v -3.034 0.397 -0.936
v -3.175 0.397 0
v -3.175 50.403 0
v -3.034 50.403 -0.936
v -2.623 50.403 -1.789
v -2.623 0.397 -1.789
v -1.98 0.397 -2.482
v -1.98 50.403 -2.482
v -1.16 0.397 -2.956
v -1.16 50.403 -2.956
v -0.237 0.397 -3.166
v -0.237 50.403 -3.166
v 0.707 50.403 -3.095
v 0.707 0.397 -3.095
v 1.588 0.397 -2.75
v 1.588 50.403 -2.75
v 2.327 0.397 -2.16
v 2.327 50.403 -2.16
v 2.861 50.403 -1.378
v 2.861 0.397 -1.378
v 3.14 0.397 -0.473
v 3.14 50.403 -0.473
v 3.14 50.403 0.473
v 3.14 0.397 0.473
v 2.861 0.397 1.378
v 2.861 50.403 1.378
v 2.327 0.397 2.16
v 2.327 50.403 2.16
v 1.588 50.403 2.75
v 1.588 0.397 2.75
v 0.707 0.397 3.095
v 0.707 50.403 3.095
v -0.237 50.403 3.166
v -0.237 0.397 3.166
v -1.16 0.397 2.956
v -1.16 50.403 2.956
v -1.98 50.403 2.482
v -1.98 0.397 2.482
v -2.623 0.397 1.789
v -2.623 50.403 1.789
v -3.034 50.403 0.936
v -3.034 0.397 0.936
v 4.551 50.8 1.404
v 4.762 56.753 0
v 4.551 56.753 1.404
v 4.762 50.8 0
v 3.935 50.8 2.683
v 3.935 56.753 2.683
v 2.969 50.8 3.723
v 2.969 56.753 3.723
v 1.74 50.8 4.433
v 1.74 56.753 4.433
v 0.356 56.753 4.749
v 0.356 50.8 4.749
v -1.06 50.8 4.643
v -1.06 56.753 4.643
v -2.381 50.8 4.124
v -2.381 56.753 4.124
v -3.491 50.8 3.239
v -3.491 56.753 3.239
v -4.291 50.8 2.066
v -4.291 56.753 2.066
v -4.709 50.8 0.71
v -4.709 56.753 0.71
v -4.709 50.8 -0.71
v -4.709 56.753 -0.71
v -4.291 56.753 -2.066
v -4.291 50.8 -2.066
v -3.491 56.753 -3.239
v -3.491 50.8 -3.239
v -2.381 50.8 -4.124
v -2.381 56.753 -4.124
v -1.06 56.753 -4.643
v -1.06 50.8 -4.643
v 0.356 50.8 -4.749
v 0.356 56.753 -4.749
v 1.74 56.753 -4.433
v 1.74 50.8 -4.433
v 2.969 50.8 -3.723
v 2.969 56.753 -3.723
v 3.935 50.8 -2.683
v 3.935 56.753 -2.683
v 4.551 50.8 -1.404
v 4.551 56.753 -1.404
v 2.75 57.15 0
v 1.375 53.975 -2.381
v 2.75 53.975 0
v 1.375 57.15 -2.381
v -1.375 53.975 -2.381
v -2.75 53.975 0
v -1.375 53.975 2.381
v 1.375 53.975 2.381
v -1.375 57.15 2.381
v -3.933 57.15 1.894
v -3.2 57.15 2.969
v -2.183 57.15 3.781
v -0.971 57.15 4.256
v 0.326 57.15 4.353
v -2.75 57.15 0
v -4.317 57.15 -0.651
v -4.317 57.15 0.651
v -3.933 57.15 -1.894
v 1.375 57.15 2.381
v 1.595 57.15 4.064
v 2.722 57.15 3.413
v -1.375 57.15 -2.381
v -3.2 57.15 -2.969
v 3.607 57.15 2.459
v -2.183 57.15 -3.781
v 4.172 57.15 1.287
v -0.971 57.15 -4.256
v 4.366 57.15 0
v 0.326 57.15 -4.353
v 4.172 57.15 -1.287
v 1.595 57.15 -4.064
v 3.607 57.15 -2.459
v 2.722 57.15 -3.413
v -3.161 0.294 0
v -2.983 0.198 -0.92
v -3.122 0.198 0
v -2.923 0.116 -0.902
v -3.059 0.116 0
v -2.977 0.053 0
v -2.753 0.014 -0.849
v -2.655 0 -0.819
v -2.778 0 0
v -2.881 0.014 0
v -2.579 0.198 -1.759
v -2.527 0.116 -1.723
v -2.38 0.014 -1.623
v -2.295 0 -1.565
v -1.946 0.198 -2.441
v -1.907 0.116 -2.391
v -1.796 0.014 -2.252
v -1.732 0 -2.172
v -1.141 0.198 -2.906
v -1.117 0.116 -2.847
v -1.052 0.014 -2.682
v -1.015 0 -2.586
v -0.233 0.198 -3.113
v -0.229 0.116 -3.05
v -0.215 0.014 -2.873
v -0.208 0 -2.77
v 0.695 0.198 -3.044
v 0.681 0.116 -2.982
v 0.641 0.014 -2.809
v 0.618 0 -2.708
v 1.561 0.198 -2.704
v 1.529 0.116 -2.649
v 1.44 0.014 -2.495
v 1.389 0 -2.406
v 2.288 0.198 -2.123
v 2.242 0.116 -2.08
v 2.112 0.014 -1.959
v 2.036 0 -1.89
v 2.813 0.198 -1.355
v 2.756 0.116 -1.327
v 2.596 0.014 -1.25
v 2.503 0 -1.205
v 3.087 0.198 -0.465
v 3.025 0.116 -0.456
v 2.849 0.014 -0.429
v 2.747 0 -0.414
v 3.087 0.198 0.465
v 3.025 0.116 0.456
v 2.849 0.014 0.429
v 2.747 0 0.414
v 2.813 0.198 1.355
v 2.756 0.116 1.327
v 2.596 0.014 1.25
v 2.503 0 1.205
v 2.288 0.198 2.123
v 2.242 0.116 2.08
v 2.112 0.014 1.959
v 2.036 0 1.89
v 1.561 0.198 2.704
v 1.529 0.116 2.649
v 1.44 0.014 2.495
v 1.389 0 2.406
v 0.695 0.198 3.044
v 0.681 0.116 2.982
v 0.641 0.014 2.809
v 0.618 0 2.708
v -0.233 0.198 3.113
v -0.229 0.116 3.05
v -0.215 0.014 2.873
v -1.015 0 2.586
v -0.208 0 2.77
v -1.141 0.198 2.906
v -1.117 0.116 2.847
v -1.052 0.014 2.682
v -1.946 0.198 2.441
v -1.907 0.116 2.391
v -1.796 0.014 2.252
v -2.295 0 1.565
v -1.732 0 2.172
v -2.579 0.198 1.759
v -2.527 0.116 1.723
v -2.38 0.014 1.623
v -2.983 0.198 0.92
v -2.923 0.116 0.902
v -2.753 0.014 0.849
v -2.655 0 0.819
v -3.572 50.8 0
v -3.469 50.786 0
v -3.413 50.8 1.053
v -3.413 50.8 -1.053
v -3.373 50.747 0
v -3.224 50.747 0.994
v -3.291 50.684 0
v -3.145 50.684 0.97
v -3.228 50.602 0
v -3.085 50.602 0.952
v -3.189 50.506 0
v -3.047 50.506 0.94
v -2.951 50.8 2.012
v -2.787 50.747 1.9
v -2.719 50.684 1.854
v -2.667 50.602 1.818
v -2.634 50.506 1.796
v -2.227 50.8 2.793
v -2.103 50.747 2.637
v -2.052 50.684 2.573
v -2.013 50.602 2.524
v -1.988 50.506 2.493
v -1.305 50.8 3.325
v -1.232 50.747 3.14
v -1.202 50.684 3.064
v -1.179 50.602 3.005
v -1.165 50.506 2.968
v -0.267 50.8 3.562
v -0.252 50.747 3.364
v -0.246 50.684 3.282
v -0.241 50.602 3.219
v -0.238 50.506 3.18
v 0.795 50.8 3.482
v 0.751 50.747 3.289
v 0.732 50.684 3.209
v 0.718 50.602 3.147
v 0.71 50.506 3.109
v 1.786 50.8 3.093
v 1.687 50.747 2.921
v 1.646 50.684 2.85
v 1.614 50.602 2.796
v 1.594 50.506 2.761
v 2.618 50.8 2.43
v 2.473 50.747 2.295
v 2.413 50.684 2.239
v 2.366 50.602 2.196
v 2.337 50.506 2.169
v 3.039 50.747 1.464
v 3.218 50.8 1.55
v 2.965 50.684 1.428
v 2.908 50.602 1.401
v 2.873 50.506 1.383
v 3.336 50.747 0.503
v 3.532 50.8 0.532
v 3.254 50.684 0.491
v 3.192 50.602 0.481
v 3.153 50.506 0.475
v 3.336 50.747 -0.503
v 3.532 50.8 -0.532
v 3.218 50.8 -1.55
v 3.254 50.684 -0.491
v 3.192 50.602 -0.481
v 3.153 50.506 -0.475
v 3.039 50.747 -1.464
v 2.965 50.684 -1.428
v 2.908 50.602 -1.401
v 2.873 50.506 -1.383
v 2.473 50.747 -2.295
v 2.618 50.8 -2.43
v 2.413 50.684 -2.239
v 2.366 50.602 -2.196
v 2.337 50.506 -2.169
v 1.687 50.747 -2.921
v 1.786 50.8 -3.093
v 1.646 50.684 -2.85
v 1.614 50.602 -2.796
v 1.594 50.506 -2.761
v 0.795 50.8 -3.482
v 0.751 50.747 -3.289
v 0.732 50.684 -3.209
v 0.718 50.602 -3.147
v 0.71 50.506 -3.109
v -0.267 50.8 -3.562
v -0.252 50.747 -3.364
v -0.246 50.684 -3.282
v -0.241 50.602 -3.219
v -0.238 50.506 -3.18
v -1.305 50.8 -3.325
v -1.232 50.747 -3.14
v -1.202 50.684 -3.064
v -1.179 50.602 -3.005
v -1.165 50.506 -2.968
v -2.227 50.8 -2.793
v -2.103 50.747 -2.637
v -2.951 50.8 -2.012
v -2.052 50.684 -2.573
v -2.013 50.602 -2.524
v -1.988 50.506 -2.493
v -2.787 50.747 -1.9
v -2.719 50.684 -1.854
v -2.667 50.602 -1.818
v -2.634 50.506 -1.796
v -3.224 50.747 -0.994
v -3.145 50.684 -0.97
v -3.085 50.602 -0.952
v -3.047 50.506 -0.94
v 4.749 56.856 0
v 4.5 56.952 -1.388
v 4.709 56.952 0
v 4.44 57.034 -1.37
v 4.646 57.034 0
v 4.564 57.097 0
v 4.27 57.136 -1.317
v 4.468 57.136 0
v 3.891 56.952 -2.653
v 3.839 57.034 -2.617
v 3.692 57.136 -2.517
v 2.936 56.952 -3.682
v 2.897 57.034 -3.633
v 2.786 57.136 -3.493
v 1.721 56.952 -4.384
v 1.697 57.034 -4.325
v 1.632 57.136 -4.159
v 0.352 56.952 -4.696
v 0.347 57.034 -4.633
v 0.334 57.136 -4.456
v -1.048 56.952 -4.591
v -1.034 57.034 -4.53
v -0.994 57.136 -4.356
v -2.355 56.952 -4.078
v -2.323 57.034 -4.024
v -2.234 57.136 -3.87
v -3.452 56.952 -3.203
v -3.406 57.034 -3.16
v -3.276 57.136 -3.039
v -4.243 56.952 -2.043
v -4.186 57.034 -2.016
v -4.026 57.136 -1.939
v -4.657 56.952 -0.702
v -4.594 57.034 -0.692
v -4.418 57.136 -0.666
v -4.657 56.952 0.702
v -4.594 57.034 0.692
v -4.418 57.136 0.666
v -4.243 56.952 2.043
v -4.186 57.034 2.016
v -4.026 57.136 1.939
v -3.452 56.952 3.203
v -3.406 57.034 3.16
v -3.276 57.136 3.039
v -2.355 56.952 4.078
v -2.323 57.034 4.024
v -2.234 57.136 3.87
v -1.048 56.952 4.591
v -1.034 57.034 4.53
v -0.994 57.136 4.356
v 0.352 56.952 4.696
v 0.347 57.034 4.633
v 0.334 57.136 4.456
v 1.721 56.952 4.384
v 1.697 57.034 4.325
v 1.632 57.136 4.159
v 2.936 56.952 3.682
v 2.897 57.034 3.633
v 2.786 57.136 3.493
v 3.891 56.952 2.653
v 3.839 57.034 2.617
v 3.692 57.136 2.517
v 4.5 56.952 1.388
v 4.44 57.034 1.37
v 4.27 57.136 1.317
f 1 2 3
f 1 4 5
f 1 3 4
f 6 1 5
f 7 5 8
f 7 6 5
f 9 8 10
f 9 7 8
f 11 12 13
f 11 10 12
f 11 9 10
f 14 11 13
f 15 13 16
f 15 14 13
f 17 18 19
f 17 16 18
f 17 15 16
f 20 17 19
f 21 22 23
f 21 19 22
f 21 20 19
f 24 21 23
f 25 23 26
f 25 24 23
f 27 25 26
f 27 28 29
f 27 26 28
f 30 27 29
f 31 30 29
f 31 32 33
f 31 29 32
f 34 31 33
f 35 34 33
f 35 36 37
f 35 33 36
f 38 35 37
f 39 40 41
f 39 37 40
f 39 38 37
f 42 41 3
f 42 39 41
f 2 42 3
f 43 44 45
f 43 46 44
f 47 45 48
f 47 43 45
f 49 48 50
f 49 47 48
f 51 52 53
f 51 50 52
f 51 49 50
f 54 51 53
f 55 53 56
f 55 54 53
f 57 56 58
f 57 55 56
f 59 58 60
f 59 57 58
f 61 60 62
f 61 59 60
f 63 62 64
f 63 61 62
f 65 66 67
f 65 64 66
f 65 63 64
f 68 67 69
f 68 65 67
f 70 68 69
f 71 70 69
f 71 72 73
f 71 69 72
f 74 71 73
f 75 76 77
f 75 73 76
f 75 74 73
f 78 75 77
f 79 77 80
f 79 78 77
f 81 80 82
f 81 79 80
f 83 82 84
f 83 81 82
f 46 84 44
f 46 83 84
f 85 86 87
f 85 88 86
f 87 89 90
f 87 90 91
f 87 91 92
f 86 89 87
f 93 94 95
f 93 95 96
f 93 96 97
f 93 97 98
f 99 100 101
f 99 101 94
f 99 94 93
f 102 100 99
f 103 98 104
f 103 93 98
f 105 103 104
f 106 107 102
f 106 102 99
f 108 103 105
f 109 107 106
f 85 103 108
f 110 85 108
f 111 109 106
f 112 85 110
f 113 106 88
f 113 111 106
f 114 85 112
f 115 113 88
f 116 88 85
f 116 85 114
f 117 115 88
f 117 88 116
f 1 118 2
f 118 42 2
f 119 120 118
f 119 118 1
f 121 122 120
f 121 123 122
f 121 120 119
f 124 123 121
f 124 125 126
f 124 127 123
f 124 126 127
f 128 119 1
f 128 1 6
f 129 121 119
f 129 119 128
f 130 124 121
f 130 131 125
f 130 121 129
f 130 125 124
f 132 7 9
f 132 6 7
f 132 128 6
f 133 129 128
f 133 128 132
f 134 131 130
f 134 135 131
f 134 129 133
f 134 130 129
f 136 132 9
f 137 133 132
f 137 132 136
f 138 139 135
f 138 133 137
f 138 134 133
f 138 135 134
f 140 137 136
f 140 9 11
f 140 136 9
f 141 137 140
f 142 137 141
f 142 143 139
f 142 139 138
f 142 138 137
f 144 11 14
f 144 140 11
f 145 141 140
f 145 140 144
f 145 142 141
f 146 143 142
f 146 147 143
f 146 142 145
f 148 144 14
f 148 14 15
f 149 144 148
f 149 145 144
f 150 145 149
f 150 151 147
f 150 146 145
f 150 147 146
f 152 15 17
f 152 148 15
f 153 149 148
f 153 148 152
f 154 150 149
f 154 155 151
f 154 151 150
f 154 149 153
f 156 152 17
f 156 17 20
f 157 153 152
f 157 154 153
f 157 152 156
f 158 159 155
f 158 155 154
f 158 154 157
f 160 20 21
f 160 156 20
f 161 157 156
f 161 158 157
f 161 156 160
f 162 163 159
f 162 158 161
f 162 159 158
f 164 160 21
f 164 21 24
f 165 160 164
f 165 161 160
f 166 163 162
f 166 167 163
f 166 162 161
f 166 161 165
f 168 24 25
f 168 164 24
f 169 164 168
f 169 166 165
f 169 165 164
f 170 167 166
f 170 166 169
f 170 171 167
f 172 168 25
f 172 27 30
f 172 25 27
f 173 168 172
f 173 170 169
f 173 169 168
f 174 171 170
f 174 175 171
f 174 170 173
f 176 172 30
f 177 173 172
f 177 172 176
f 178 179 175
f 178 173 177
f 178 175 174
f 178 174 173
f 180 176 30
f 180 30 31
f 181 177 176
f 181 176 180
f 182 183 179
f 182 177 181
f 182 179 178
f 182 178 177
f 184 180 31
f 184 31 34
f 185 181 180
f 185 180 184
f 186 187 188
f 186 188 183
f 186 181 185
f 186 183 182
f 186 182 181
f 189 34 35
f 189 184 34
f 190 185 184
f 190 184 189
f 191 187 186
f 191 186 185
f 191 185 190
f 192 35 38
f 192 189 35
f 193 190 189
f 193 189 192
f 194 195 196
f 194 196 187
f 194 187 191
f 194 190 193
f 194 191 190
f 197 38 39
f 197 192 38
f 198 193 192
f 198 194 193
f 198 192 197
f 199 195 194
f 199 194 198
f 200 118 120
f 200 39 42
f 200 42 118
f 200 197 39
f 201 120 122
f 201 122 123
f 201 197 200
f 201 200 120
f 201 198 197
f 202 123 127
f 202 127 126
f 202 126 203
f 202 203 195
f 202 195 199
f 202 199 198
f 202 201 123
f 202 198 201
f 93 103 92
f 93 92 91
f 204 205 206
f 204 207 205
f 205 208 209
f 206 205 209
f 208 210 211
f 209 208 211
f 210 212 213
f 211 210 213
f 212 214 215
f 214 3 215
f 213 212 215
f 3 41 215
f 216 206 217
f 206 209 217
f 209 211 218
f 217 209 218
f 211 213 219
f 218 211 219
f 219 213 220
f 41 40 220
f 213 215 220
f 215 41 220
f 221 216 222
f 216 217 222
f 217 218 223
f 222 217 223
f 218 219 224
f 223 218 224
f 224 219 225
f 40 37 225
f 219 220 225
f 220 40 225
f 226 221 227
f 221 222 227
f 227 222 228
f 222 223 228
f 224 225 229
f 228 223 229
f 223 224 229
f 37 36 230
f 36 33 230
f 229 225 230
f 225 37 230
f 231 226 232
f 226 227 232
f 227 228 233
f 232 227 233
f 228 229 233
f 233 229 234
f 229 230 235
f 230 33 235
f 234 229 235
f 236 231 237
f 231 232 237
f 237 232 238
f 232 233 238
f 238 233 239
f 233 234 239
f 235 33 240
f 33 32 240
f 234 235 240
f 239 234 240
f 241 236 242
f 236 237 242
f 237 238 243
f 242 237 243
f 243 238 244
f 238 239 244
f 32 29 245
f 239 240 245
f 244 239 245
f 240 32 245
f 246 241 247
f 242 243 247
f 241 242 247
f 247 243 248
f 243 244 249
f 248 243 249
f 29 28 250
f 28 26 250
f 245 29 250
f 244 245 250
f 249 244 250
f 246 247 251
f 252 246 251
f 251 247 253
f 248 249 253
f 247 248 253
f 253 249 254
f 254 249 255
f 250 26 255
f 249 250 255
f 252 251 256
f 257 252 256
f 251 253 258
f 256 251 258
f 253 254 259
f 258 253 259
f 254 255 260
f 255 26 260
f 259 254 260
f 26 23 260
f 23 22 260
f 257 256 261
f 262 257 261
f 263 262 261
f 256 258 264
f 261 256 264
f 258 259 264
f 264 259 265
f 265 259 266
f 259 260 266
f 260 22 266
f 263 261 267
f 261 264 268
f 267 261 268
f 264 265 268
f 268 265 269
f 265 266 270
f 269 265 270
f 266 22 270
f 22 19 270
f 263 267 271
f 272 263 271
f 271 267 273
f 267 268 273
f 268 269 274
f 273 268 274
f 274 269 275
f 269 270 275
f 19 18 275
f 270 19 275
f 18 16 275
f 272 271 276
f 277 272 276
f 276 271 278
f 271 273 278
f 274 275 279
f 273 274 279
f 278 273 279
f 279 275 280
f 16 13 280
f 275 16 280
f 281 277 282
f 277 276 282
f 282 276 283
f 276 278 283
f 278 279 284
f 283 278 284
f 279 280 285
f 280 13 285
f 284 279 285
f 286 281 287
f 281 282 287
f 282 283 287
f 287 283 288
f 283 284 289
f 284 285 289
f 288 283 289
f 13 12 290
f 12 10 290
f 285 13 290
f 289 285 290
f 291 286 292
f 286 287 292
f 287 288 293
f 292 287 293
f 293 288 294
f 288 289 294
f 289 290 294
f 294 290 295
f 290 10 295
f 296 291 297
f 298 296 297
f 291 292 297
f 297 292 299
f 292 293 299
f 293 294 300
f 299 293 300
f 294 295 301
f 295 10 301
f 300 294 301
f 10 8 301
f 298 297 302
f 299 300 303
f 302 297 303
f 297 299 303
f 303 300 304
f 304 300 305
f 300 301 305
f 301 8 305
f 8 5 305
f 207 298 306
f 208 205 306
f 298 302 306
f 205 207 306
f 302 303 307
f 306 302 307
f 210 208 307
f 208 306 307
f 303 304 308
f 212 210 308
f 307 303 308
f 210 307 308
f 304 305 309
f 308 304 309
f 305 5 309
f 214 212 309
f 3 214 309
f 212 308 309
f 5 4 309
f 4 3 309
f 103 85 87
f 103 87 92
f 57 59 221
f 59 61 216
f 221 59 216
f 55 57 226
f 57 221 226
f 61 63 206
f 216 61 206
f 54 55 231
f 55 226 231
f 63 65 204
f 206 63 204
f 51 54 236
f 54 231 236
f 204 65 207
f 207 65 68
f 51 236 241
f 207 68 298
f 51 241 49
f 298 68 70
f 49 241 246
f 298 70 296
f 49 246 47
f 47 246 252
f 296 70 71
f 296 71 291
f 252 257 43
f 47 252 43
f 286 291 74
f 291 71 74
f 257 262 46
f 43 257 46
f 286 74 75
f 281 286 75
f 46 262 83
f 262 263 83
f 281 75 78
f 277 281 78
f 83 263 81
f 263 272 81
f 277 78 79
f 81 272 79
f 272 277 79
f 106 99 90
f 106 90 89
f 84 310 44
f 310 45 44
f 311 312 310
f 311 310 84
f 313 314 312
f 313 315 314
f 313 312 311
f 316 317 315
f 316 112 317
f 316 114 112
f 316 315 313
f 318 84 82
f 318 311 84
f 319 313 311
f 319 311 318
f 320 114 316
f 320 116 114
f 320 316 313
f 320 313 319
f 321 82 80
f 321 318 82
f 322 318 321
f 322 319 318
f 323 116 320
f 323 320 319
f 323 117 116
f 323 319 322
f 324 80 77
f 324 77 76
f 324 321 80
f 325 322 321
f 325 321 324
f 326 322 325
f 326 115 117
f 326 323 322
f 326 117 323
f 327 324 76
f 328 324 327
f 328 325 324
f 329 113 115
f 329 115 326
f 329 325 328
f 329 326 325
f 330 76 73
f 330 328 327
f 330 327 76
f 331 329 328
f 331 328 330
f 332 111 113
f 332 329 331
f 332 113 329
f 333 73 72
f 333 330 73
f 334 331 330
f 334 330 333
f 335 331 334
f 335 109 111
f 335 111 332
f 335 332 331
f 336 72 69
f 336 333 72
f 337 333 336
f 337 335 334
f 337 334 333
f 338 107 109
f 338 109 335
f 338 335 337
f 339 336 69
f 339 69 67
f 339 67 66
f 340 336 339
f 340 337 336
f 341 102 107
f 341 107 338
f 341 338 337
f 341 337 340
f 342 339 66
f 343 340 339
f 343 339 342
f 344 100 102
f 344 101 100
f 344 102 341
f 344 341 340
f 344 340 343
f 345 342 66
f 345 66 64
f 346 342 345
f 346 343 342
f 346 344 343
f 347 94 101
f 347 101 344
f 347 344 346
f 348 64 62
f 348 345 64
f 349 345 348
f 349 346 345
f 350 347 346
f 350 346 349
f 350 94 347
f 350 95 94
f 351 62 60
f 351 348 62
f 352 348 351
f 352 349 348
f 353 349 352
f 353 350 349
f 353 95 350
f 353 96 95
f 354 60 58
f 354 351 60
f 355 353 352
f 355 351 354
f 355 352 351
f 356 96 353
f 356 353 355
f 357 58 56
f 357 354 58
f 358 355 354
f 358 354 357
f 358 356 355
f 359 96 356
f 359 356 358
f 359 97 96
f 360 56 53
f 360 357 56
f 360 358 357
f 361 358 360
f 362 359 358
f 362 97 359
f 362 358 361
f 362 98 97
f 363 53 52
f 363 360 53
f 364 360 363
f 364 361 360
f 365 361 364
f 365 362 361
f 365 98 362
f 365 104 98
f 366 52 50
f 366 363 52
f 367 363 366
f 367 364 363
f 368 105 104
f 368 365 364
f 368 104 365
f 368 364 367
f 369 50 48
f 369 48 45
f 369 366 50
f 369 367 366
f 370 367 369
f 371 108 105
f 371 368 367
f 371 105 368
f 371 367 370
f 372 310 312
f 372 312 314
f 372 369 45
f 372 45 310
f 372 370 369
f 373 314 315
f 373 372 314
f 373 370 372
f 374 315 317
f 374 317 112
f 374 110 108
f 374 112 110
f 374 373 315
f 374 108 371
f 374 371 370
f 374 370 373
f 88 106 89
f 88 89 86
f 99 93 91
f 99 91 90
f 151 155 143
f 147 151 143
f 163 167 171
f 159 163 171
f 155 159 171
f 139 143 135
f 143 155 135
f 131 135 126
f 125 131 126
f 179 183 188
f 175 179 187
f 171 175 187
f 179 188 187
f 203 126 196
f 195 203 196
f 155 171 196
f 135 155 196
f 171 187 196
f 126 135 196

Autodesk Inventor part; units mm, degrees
ref_plane "YZ Plane" through (0, 0, 0) normal (1, 0, 0) x (0, 1, 0)
ref_plane "XZ Plane" through (0, 0, 0) normal (0, 1, 0) x (-1, 0, 0)
ref_plane "XY Plane" through (0, 0, 0) normal (0, 0, 1) x (1, 0, 0)
sketch "Sketch1" plane through (0, 0, 0) normal (0, 1, 0) x (-1, 0, 0)
  circle A0 centre (0, 0) radius 3.175
  dimension "d0" = 6.35
extrude "Extrusion1" add sketch "Sketch1" along normal blind 50.8
sketch "Sketch2" plane through (0, 50.8, 0) normal (0, 1, 0) x (1, 0, 0)
  circle A0 centre (0, 0) radius 3.175 projected
  circle A1 centre (0, 0) radius 4.7625
  dimension "d3" = 9.525
extrude "Extrusion2" add sketch "Sketch2" along normal blind 6.35 contours A0 | A1
sketch "Sketch3" plane through (0, 57.15, 0) normal (0, 1, 0) x (1, 0, 0)
  circle A0 centre (0, 0) radius 4.7625 projected
  line L0 (-1.3748, 2.3812) -> (1.3748, 2.3813)
  line L1 (1.3748, 2.3813) -> (2.7496, 0)
  line L2 (2.7496, 0) -> (1.3748, -2.3813)
  line L3 (1.3748, -2.3813) -> (-1.3748, -2.3813)
  line L4 (-1.3748, -2.3813) -> (-2.7496, 0)
  line L5 (-2.7496, 0) -> (-1.3748, 2.3812)
  dimension "d6" = 4.7625
extrude "Extrusion3" cut sketch "Sketch3" against normal blind 3.175 contours L0 L1 L2 L3 L4 L5
fillet "Fillet1" radius 0.3969 3 edges at (3.175, 50.8, 0) (-4.7625, 57.15, 0) (3.175, 0, 0)
properties part number "Bolt_0.25_20_2.0len_SocketHead" material "Stainless Steel, Austenitic"
